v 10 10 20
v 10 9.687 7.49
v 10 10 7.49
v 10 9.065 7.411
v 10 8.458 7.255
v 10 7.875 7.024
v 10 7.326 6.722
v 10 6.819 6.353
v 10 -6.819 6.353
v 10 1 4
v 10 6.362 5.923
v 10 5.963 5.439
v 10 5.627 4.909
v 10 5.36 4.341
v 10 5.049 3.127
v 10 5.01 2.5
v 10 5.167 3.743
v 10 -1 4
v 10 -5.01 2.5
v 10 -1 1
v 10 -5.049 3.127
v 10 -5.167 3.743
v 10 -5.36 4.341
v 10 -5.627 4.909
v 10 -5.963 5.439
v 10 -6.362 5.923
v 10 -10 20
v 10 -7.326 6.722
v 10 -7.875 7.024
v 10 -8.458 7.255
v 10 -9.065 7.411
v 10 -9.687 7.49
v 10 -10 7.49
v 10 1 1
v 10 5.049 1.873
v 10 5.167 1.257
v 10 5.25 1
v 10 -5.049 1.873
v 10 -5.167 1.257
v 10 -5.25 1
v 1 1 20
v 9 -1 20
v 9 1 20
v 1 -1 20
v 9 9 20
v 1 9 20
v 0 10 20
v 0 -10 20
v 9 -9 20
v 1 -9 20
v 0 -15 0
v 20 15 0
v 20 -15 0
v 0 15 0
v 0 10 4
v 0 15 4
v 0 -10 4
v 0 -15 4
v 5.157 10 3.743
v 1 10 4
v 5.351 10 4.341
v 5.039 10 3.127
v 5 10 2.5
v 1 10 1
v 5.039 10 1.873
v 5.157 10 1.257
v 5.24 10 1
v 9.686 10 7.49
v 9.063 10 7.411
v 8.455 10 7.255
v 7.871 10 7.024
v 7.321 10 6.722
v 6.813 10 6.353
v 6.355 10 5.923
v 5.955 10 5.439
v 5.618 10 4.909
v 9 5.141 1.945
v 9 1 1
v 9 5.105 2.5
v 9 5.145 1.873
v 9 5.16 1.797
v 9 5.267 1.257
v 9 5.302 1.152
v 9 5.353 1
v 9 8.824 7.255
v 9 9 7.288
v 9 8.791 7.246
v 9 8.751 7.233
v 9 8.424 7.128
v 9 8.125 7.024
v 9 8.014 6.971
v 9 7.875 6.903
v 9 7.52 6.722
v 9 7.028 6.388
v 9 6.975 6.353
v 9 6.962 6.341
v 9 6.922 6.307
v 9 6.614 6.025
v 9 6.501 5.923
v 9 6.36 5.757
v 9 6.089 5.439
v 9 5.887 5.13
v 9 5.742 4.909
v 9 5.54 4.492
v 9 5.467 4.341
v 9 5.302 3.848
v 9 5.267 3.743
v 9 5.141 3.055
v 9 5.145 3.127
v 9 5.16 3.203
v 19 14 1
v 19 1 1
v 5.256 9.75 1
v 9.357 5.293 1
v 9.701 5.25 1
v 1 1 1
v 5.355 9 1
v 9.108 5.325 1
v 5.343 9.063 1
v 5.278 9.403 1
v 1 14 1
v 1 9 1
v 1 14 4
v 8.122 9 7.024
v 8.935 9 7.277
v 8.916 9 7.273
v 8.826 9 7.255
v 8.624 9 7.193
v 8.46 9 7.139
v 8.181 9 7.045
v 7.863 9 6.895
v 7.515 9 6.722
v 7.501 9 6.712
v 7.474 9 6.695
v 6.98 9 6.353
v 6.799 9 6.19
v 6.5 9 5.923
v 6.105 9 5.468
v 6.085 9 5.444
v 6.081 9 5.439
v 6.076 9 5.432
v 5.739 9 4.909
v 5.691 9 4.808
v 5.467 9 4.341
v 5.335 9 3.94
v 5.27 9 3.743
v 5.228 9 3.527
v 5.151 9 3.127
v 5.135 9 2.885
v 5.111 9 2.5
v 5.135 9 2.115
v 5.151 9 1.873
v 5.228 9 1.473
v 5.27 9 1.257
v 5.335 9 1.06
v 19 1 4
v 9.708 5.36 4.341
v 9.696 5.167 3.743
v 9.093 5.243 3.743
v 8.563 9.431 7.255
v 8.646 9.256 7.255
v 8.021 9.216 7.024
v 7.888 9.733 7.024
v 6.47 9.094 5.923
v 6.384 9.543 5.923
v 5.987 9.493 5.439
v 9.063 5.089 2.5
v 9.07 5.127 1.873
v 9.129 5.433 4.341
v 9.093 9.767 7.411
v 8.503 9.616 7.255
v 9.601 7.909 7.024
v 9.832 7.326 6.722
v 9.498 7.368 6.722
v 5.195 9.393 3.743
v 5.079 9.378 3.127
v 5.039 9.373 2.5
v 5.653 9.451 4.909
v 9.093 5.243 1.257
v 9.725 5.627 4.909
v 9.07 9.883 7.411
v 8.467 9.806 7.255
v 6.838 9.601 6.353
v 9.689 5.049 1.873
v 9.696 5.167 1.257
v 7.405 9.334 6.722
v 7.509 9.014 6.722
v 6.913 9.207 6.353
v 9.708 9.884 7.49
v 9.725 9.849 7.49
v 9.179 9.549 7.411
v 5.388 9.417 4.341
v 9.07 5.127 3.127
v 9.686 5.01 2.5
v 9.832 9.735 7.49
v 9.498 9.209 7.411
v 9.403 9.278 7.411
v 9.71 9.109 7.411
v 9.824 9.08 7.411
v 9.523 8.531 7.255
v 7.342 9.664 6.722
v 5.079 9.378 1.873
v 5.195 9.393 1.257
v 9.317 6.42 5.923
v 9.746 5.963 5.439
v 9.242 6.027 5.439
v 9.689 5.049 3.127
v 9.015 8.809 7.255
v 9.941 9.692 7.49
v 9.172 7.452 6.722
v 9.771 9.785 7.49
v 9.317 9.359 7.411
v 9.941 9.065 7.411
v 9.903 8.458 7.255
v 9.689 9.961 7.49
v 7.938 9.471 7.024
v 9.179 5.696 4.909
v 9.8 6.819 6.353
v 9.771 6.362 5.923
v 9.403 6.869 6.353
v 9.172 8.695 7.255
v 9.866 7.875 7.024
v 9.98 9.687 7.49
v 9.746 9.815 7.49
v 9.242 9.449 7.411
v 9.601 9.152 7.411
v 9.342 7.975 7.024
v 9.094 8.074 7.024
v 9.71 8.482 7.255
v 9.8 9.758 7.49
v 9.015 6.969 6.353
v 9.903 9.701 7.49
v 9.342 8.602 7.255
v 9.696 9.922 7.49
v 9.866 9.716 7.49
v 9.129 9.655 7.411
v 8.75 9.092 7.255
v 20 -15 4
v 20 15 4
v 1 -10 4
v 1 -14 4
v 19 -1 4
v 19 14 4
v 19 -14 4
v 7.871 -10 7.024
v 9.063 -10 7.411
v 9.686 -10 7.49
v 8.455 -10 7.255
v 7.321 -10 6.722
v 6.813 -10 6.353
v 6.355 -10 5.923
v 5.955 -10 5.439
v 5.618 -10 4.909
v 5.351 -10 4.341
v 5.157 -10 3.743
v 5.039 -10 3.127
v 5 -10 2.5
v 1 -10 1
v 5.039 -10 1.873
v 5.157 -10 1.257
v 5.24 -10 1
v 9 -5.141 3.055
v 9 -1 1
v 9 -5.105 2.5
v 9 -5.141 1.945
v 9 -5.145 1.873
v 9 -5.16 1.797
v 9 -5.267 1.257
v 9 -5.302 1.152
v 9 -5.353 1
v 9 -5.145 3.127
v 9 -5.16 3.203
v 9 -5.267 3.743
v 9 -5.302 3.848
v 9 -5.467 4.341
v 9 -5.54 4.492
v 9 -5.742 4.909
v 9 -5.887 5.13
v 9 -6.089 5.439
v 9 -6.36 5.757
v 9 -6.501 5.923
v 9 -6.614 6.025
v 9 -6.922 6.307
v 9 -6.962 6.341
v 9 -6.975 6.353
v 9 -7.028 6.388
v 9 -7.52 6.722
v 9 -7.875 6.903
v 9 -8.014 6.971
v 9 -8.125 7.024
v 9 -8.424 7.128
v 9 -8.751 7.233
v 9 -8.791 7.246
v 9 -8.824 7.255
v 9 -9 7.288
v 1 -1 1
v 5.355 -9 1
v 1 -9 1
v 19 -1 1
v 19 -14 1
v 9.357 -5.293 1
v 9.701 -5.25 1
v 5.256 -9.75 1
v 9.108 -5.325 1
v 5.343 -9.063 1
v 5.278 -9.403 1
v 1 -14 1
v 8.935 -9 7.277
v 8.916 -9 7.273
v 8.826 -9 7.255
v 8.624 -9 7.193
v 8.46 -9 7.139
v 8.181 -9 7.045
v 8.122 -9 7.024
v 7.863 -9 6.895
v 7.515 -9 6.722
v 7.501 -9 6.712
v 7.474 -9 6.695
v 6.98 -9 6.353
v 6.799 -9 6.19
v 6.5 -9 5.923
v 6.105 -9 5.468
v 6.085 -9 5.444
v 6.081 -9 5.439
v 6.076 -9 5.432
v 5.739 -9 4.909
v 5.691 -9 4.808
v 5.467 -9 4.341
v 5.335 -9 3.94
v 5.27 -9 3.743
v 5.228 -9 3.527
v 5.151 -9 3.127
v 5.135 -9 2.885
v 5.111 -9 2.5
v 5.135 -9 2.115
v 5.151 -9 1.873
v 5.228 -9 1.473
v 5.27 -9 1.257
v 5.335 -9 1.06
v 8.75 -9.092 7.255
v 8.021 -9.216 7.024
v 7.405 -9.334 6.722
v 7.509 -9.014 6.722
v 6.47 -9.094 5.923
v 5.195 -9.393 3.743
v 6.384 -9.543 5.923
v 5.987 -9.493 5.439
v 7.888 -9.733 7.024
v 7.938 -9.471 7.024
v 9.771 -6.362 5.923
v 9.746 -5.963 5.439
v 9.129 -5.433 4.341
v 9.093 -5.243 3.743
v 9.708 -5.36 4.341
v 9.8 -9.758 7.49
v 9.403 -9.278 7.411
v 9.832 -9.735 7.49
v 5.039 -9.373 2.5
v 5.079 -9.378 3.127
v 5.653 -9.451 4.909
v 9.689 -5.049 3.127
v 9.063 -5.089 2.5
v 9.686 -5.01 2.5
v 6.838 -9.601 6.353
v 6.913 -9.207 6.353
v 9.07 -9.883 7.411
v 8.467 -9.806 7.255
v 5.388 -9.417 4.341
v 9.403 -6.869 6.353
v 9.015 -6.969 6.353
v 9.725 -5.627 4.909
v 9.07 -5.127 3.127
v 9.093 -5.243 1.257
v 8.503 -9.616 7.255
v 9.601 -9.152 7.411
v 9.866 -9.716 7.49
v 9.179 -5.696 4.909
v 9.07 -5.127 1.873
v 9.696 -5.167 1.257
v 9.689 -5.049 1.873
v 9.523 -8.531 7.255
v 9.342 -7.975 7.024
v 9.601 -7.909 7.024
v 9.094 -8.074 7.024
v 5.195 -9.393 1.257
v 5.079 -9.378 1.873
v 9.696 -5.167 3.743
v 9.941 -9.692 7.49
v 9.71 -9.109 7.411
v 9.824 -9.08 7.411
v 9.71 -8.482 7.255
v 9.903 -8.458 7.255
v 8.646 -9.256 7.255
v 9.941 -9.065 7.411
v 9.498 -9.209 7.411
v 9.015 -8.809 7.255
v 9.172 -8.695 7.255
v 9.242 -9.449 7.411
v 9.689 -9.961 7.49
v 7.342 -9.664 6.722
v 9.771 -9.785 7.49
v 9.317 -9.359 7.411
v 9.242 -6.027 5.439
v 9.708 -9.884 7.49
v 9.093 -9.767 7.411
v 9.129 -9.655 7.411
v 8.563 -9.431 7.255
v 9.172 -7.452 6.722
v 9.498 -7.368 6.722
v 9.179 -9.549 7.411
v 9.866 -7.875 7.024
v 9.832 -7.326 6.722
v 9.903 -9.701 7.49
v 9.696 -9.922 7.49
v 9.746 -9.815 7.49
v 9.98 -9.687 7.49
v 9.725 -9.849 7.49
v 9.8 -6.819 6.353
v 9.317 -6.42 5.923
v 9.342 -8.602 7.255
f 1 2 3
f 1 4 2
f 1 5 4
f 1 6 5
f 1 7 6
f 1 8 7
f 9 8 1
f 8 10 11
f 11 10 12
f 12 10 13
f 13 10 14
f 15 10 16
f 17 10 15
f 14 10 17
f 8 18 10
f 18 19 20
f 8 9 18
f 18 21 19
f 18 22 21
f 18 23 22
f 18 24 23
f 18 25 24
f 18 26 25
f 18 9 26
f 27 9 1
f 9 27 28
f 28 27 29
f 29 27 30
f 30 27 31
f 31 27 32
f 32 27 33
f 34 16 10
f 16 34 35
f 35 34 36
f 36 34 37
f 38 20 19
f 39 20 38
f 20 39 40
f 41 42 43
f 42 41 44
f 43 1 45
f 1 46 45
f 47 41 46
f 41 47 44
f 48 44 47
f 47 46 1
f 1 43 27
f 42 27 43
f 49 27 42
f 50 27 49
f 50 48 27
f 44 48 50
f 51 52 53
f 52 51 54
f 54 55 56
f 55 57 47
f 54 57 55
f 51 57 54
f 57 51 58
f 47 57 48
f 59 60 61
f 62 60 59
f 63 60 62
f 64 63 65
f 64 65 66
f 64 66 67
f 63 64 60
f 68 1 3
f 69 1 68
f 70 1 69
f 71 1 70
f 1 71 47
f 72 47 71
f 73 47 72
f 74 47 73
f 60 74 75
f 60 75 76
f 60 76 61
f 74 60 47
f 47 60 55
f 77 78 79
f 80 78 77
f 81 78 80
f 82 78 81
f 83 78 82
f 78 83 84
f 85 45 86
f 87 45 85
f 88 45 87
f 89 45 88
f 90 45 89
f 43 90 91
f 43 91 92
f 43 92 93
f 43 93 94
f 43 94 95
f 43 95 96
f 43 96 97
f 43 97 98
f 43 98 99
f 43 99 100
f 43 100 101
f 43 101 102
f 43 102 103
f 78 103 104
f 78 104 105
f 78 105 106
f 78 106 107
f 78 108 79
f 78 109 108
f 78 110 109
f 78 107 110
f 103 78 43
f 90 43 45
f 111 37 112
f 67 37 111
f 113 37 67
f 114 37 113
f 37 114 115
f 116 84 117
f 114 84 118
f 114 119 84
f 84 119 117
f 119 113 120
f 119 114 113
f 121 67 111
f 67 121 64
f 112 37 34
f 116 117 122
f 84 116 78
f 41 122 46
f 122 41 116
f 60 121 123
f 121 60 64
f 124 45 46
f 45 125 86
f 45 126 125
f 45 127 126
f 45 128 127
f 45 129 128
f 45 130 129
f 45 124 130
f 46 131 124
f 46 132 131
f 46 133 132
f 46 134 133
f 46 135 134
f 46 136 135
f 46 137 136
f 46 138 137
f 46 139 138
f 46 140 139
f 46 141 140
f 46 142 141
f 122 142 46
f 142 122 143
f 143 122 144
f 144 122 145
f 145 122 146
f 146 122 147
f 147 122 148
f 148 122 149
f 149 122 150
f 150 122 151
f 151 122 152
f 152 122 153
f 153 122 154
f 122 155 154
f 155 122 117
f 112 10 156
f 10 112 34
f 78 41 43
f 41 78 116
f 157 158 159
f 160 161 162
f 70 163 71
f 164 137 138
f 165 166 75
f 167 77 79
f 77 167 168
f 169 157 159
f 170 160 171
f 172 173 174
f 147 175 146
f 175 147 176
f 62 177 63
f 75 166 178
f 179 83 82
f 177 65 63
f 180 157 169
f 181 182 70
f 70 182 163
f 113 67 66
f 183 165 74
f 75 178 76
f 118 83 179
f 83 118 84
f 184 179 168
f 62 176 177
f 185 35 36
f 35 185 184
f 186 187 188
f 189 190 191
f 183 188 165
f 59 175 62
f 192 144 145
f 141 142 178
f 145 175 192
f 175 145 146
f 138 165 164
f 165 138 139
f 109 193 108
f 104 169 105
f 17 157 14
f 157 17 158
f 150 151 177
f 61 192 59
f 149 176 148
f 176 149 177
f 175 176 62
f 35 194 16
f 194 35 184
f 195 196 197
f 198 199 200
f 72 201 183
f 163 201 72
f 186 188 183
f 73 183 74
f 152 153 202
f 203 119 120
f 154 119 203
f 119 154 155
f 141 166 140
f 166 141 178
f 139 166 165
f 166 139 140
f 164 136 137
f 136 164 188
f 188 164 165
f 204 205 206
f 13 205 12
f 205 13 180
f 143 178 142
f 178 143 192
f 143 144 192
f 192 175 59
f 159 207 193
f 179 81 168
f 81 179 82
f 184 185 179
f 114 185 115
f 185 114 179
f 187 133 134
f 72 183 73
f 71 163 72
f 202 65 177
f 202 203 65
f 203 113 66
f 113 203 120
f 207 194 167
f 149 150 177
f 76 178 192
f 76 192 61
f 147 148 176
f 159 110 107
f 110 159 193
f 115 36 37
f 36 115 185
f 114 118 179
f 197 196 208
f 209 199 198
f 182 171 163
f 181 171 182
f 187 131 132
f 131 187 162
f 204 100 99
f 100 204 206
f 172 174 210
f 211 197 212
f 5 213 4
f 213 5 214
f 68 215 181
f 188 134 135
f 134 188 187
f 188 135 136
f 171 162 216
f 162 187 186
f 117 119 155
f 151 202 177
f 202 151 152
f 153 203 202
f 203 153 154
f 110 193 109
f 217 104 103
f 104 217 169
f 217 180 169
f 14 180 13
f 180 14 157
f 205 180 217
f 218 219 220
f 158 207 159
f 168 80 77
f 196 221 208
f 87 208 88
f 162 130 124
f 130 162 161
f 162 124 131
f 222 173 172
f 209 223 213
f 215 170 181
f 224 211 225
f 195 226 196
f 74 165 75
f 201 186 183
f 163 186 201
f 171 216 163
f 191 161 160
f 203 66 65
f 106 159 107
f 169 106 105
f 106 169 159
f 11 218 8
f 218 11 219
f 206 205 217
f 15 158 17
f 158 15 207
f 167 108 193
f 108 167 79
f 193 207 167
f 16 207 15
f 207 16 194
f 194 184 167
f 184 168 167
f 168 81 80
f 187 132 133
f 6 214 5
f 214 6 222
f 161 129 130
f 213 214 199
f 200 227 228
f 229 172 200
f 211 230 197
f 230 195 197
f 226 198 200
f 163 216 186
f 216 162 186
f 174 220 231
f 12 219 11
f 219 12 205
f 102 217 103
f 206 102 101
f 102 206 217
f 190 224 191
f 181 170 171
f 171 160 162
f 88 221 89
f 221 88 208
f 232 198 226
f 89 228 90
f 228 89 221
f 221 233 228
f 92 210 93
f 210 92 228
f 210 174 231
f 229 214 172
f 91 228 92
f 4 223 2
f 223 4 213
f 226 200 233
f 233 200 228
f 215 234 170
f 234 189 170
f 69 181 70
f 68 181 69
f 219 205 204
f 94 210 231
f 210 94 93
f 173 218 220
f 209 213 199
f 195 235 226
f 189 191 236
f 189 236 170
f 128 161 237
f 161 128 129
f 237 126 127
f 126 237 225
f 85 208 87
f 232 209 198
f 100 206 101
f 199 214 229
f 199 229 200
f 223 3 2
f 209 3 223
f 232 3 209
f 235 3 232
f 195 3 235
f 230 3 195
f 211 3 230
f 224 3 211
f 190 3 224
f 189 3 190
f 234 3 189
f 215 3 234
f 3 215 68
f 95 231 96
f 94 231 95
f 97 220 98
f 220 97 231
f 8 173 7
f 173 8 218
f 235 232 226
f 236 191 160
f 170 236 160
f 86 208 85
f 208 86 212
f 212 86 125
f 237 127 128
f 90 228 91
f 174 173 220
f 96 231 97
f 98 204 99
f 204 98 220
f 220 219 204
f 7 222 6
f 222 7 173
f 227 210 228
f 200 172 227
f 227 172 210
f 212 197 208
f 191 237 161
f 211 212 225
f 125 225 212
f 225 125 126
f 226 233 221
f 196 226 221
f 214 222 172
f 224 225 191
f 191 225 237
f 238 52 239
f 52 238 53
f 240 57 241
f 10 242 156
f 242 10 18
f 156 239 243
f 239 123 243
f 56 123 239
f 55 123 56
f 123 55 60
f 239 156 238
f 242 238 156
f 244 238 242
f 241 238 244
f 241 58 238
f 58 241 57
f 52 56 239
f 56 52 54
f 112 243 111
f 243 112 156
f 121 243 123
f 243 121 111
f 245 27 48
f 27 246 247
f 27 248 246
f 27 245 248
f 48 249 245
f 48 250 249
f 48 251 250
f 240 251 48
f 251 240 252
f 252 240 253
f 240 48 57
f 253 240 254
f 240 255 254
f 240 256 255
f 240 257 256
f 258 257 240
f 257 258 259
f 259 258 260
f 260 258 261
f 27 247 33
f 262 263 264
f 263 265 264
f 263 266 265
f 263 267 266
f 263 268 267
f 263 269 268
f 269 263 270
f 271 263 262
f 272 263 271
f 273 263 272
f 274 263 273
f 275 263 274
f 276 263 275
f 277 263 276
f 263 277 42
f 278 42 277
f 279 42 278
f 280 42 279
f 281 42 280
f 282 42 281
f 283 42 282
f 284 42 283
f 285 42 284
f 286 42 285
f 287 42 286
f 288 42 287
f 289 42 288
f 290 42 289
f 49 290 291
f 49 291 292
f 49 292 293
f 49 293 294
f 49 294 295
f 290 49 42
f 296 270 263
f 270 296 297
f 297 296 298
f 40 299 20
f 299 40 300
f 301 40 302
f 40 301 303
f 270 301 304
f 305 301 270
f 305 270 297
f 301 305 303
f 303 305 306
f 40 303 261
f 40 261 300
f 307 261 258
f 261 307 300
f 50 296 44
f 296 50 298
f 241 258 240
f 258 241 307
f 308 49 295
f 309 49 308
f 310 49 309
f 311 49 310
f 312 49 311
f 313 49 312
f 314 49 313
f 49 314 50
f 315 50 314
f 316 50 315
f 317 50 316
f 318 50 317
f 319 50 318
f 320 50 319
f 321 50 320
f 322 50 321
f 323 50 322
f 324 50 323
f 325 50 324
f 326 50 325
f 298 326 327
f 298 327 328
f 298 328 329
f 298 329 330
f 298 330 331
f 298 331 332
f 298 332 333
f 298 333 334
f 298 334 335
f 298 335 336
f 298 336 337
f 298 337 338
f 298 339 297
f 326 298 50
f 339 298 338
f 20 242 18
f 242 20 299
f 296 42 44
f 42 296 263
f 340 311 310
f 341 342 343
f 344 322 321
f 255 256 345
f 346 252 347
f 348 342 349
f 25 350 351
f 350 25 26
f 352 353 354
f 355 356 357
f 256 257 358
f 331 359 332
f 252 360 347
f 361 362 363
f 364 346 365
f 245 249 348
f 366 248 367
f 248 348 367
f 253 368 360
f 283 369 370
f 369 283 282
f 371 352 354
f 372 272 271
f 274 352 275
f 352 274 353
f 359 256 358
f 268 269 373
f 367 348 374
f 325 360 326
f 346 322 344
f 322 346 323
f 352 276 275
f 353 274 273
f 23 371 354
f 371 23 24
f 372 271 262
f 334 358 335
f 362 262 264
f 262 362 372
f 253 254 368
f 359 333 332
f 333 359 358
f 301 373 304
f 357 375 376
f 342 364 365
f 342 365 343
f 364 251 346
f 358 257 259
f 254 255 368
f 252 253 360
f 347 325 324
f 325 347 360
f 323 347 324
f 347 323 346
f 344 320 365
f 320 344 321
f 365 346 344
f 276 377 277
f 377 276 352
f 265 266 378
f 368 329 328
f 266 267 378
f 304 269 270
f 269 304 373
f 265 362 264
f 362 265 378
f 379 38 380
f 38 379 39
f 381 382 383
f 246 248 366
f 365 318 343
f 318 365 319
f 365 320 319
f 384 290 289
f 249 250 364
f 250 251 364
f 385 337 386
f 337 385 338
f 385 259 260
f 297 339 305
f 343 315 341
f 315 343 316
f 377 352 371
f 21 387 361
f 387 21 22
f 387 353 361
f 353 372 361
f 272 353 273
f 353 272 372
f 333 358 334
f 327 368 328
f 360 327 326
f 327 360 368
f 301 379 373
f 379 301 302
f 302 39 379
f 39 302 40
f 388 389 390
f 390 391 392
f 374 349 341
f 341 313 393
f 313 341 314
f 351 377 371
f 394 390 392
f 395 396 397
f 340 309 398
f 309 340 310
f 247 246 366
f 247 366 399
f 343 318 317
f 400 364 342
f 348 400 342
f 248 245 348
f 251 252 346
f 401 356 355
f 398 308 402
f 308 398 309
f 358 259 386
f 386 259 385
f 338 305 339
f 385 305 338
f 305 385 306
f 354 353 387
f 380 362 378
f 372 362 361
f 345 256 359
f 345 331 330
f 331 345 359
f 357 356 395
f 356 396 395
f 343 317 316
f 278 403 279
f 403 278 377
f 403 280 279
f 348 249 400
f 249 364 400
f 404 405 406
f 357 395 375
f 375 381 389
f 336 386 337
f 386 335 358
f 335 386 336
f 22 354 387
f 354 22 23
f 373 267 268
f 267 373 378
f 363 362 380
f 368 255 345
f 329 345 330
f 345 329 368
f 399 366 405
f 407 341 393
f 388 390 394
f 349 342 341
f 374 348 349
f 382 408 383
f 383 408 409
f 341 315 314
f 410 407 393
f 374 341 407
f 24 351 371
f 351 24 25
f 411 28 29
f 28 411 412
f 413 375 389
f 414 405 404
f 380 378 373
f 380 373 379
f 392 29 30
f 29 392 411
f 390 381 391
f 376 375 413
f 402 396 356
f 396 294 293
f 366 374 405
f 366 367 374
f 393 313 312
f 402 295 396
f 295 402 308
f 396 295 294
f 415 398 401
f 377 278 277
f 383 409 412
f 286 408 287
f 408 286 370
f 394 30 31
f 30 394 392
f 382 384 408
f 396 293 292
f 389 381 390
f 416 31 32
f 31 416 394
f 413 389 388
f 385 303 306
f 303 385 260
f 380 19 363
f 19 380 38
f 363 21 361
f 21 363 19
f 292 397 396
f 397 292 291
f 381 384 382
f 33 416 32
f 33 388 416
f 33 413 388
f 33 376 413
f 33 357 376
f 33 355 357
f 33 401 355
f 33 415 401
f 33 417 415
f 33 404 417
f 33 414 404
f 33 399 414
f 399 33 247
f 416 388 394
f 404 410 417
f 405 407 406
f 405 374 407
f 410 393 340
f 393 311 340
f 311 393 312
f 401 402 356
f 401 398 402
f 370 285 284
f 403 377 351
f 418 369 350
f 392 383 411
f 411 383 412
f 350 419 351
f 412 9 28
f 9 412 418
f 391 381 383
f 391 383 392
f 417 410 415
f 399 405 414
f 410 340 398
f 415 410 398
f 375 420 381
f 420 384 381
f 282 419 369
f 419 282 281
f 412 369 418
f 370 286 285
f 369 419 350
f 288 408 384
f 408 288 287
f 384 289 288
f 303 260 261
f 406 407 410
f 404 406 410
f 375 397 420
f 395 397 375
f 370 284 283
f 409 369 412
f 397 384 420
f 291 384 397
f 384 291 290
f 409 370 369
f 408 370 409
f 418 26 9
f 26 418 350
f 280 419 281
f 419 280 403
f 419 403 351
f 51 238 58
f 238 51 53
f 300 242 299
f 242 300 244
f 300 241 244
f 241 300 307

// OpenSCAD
//Transforming Shapes - Desktop Organizer

$fn =50;

height = 20;
width = 10;

difference(){
    cube([width, width, height]);
    translate([1,1,1]) cube([width-2, width-2, height]);
    translate([width, width, width/4]) sphere(width/2);
}//pen holder
difference(){
    cube([width*2, width*1.5, 4]);
    translate([1,1,1]) cube([width*2-2, width*1.5-2, 5]);
}//tray

mirror([0,1,0]){
    difference(){
        cube([width, width, height]);
        translate([1,1,1]) cube([width-2, width-2, height]);
        translate([width, width, width/4]) sphere(width/2);
    }//pencil holder
    difference(){
        cube([width*2, width*1.5, 4]);
        translate([1,1,1]) cube([width*2-2, width*1.5-2, 5]);
    }//tray
}
